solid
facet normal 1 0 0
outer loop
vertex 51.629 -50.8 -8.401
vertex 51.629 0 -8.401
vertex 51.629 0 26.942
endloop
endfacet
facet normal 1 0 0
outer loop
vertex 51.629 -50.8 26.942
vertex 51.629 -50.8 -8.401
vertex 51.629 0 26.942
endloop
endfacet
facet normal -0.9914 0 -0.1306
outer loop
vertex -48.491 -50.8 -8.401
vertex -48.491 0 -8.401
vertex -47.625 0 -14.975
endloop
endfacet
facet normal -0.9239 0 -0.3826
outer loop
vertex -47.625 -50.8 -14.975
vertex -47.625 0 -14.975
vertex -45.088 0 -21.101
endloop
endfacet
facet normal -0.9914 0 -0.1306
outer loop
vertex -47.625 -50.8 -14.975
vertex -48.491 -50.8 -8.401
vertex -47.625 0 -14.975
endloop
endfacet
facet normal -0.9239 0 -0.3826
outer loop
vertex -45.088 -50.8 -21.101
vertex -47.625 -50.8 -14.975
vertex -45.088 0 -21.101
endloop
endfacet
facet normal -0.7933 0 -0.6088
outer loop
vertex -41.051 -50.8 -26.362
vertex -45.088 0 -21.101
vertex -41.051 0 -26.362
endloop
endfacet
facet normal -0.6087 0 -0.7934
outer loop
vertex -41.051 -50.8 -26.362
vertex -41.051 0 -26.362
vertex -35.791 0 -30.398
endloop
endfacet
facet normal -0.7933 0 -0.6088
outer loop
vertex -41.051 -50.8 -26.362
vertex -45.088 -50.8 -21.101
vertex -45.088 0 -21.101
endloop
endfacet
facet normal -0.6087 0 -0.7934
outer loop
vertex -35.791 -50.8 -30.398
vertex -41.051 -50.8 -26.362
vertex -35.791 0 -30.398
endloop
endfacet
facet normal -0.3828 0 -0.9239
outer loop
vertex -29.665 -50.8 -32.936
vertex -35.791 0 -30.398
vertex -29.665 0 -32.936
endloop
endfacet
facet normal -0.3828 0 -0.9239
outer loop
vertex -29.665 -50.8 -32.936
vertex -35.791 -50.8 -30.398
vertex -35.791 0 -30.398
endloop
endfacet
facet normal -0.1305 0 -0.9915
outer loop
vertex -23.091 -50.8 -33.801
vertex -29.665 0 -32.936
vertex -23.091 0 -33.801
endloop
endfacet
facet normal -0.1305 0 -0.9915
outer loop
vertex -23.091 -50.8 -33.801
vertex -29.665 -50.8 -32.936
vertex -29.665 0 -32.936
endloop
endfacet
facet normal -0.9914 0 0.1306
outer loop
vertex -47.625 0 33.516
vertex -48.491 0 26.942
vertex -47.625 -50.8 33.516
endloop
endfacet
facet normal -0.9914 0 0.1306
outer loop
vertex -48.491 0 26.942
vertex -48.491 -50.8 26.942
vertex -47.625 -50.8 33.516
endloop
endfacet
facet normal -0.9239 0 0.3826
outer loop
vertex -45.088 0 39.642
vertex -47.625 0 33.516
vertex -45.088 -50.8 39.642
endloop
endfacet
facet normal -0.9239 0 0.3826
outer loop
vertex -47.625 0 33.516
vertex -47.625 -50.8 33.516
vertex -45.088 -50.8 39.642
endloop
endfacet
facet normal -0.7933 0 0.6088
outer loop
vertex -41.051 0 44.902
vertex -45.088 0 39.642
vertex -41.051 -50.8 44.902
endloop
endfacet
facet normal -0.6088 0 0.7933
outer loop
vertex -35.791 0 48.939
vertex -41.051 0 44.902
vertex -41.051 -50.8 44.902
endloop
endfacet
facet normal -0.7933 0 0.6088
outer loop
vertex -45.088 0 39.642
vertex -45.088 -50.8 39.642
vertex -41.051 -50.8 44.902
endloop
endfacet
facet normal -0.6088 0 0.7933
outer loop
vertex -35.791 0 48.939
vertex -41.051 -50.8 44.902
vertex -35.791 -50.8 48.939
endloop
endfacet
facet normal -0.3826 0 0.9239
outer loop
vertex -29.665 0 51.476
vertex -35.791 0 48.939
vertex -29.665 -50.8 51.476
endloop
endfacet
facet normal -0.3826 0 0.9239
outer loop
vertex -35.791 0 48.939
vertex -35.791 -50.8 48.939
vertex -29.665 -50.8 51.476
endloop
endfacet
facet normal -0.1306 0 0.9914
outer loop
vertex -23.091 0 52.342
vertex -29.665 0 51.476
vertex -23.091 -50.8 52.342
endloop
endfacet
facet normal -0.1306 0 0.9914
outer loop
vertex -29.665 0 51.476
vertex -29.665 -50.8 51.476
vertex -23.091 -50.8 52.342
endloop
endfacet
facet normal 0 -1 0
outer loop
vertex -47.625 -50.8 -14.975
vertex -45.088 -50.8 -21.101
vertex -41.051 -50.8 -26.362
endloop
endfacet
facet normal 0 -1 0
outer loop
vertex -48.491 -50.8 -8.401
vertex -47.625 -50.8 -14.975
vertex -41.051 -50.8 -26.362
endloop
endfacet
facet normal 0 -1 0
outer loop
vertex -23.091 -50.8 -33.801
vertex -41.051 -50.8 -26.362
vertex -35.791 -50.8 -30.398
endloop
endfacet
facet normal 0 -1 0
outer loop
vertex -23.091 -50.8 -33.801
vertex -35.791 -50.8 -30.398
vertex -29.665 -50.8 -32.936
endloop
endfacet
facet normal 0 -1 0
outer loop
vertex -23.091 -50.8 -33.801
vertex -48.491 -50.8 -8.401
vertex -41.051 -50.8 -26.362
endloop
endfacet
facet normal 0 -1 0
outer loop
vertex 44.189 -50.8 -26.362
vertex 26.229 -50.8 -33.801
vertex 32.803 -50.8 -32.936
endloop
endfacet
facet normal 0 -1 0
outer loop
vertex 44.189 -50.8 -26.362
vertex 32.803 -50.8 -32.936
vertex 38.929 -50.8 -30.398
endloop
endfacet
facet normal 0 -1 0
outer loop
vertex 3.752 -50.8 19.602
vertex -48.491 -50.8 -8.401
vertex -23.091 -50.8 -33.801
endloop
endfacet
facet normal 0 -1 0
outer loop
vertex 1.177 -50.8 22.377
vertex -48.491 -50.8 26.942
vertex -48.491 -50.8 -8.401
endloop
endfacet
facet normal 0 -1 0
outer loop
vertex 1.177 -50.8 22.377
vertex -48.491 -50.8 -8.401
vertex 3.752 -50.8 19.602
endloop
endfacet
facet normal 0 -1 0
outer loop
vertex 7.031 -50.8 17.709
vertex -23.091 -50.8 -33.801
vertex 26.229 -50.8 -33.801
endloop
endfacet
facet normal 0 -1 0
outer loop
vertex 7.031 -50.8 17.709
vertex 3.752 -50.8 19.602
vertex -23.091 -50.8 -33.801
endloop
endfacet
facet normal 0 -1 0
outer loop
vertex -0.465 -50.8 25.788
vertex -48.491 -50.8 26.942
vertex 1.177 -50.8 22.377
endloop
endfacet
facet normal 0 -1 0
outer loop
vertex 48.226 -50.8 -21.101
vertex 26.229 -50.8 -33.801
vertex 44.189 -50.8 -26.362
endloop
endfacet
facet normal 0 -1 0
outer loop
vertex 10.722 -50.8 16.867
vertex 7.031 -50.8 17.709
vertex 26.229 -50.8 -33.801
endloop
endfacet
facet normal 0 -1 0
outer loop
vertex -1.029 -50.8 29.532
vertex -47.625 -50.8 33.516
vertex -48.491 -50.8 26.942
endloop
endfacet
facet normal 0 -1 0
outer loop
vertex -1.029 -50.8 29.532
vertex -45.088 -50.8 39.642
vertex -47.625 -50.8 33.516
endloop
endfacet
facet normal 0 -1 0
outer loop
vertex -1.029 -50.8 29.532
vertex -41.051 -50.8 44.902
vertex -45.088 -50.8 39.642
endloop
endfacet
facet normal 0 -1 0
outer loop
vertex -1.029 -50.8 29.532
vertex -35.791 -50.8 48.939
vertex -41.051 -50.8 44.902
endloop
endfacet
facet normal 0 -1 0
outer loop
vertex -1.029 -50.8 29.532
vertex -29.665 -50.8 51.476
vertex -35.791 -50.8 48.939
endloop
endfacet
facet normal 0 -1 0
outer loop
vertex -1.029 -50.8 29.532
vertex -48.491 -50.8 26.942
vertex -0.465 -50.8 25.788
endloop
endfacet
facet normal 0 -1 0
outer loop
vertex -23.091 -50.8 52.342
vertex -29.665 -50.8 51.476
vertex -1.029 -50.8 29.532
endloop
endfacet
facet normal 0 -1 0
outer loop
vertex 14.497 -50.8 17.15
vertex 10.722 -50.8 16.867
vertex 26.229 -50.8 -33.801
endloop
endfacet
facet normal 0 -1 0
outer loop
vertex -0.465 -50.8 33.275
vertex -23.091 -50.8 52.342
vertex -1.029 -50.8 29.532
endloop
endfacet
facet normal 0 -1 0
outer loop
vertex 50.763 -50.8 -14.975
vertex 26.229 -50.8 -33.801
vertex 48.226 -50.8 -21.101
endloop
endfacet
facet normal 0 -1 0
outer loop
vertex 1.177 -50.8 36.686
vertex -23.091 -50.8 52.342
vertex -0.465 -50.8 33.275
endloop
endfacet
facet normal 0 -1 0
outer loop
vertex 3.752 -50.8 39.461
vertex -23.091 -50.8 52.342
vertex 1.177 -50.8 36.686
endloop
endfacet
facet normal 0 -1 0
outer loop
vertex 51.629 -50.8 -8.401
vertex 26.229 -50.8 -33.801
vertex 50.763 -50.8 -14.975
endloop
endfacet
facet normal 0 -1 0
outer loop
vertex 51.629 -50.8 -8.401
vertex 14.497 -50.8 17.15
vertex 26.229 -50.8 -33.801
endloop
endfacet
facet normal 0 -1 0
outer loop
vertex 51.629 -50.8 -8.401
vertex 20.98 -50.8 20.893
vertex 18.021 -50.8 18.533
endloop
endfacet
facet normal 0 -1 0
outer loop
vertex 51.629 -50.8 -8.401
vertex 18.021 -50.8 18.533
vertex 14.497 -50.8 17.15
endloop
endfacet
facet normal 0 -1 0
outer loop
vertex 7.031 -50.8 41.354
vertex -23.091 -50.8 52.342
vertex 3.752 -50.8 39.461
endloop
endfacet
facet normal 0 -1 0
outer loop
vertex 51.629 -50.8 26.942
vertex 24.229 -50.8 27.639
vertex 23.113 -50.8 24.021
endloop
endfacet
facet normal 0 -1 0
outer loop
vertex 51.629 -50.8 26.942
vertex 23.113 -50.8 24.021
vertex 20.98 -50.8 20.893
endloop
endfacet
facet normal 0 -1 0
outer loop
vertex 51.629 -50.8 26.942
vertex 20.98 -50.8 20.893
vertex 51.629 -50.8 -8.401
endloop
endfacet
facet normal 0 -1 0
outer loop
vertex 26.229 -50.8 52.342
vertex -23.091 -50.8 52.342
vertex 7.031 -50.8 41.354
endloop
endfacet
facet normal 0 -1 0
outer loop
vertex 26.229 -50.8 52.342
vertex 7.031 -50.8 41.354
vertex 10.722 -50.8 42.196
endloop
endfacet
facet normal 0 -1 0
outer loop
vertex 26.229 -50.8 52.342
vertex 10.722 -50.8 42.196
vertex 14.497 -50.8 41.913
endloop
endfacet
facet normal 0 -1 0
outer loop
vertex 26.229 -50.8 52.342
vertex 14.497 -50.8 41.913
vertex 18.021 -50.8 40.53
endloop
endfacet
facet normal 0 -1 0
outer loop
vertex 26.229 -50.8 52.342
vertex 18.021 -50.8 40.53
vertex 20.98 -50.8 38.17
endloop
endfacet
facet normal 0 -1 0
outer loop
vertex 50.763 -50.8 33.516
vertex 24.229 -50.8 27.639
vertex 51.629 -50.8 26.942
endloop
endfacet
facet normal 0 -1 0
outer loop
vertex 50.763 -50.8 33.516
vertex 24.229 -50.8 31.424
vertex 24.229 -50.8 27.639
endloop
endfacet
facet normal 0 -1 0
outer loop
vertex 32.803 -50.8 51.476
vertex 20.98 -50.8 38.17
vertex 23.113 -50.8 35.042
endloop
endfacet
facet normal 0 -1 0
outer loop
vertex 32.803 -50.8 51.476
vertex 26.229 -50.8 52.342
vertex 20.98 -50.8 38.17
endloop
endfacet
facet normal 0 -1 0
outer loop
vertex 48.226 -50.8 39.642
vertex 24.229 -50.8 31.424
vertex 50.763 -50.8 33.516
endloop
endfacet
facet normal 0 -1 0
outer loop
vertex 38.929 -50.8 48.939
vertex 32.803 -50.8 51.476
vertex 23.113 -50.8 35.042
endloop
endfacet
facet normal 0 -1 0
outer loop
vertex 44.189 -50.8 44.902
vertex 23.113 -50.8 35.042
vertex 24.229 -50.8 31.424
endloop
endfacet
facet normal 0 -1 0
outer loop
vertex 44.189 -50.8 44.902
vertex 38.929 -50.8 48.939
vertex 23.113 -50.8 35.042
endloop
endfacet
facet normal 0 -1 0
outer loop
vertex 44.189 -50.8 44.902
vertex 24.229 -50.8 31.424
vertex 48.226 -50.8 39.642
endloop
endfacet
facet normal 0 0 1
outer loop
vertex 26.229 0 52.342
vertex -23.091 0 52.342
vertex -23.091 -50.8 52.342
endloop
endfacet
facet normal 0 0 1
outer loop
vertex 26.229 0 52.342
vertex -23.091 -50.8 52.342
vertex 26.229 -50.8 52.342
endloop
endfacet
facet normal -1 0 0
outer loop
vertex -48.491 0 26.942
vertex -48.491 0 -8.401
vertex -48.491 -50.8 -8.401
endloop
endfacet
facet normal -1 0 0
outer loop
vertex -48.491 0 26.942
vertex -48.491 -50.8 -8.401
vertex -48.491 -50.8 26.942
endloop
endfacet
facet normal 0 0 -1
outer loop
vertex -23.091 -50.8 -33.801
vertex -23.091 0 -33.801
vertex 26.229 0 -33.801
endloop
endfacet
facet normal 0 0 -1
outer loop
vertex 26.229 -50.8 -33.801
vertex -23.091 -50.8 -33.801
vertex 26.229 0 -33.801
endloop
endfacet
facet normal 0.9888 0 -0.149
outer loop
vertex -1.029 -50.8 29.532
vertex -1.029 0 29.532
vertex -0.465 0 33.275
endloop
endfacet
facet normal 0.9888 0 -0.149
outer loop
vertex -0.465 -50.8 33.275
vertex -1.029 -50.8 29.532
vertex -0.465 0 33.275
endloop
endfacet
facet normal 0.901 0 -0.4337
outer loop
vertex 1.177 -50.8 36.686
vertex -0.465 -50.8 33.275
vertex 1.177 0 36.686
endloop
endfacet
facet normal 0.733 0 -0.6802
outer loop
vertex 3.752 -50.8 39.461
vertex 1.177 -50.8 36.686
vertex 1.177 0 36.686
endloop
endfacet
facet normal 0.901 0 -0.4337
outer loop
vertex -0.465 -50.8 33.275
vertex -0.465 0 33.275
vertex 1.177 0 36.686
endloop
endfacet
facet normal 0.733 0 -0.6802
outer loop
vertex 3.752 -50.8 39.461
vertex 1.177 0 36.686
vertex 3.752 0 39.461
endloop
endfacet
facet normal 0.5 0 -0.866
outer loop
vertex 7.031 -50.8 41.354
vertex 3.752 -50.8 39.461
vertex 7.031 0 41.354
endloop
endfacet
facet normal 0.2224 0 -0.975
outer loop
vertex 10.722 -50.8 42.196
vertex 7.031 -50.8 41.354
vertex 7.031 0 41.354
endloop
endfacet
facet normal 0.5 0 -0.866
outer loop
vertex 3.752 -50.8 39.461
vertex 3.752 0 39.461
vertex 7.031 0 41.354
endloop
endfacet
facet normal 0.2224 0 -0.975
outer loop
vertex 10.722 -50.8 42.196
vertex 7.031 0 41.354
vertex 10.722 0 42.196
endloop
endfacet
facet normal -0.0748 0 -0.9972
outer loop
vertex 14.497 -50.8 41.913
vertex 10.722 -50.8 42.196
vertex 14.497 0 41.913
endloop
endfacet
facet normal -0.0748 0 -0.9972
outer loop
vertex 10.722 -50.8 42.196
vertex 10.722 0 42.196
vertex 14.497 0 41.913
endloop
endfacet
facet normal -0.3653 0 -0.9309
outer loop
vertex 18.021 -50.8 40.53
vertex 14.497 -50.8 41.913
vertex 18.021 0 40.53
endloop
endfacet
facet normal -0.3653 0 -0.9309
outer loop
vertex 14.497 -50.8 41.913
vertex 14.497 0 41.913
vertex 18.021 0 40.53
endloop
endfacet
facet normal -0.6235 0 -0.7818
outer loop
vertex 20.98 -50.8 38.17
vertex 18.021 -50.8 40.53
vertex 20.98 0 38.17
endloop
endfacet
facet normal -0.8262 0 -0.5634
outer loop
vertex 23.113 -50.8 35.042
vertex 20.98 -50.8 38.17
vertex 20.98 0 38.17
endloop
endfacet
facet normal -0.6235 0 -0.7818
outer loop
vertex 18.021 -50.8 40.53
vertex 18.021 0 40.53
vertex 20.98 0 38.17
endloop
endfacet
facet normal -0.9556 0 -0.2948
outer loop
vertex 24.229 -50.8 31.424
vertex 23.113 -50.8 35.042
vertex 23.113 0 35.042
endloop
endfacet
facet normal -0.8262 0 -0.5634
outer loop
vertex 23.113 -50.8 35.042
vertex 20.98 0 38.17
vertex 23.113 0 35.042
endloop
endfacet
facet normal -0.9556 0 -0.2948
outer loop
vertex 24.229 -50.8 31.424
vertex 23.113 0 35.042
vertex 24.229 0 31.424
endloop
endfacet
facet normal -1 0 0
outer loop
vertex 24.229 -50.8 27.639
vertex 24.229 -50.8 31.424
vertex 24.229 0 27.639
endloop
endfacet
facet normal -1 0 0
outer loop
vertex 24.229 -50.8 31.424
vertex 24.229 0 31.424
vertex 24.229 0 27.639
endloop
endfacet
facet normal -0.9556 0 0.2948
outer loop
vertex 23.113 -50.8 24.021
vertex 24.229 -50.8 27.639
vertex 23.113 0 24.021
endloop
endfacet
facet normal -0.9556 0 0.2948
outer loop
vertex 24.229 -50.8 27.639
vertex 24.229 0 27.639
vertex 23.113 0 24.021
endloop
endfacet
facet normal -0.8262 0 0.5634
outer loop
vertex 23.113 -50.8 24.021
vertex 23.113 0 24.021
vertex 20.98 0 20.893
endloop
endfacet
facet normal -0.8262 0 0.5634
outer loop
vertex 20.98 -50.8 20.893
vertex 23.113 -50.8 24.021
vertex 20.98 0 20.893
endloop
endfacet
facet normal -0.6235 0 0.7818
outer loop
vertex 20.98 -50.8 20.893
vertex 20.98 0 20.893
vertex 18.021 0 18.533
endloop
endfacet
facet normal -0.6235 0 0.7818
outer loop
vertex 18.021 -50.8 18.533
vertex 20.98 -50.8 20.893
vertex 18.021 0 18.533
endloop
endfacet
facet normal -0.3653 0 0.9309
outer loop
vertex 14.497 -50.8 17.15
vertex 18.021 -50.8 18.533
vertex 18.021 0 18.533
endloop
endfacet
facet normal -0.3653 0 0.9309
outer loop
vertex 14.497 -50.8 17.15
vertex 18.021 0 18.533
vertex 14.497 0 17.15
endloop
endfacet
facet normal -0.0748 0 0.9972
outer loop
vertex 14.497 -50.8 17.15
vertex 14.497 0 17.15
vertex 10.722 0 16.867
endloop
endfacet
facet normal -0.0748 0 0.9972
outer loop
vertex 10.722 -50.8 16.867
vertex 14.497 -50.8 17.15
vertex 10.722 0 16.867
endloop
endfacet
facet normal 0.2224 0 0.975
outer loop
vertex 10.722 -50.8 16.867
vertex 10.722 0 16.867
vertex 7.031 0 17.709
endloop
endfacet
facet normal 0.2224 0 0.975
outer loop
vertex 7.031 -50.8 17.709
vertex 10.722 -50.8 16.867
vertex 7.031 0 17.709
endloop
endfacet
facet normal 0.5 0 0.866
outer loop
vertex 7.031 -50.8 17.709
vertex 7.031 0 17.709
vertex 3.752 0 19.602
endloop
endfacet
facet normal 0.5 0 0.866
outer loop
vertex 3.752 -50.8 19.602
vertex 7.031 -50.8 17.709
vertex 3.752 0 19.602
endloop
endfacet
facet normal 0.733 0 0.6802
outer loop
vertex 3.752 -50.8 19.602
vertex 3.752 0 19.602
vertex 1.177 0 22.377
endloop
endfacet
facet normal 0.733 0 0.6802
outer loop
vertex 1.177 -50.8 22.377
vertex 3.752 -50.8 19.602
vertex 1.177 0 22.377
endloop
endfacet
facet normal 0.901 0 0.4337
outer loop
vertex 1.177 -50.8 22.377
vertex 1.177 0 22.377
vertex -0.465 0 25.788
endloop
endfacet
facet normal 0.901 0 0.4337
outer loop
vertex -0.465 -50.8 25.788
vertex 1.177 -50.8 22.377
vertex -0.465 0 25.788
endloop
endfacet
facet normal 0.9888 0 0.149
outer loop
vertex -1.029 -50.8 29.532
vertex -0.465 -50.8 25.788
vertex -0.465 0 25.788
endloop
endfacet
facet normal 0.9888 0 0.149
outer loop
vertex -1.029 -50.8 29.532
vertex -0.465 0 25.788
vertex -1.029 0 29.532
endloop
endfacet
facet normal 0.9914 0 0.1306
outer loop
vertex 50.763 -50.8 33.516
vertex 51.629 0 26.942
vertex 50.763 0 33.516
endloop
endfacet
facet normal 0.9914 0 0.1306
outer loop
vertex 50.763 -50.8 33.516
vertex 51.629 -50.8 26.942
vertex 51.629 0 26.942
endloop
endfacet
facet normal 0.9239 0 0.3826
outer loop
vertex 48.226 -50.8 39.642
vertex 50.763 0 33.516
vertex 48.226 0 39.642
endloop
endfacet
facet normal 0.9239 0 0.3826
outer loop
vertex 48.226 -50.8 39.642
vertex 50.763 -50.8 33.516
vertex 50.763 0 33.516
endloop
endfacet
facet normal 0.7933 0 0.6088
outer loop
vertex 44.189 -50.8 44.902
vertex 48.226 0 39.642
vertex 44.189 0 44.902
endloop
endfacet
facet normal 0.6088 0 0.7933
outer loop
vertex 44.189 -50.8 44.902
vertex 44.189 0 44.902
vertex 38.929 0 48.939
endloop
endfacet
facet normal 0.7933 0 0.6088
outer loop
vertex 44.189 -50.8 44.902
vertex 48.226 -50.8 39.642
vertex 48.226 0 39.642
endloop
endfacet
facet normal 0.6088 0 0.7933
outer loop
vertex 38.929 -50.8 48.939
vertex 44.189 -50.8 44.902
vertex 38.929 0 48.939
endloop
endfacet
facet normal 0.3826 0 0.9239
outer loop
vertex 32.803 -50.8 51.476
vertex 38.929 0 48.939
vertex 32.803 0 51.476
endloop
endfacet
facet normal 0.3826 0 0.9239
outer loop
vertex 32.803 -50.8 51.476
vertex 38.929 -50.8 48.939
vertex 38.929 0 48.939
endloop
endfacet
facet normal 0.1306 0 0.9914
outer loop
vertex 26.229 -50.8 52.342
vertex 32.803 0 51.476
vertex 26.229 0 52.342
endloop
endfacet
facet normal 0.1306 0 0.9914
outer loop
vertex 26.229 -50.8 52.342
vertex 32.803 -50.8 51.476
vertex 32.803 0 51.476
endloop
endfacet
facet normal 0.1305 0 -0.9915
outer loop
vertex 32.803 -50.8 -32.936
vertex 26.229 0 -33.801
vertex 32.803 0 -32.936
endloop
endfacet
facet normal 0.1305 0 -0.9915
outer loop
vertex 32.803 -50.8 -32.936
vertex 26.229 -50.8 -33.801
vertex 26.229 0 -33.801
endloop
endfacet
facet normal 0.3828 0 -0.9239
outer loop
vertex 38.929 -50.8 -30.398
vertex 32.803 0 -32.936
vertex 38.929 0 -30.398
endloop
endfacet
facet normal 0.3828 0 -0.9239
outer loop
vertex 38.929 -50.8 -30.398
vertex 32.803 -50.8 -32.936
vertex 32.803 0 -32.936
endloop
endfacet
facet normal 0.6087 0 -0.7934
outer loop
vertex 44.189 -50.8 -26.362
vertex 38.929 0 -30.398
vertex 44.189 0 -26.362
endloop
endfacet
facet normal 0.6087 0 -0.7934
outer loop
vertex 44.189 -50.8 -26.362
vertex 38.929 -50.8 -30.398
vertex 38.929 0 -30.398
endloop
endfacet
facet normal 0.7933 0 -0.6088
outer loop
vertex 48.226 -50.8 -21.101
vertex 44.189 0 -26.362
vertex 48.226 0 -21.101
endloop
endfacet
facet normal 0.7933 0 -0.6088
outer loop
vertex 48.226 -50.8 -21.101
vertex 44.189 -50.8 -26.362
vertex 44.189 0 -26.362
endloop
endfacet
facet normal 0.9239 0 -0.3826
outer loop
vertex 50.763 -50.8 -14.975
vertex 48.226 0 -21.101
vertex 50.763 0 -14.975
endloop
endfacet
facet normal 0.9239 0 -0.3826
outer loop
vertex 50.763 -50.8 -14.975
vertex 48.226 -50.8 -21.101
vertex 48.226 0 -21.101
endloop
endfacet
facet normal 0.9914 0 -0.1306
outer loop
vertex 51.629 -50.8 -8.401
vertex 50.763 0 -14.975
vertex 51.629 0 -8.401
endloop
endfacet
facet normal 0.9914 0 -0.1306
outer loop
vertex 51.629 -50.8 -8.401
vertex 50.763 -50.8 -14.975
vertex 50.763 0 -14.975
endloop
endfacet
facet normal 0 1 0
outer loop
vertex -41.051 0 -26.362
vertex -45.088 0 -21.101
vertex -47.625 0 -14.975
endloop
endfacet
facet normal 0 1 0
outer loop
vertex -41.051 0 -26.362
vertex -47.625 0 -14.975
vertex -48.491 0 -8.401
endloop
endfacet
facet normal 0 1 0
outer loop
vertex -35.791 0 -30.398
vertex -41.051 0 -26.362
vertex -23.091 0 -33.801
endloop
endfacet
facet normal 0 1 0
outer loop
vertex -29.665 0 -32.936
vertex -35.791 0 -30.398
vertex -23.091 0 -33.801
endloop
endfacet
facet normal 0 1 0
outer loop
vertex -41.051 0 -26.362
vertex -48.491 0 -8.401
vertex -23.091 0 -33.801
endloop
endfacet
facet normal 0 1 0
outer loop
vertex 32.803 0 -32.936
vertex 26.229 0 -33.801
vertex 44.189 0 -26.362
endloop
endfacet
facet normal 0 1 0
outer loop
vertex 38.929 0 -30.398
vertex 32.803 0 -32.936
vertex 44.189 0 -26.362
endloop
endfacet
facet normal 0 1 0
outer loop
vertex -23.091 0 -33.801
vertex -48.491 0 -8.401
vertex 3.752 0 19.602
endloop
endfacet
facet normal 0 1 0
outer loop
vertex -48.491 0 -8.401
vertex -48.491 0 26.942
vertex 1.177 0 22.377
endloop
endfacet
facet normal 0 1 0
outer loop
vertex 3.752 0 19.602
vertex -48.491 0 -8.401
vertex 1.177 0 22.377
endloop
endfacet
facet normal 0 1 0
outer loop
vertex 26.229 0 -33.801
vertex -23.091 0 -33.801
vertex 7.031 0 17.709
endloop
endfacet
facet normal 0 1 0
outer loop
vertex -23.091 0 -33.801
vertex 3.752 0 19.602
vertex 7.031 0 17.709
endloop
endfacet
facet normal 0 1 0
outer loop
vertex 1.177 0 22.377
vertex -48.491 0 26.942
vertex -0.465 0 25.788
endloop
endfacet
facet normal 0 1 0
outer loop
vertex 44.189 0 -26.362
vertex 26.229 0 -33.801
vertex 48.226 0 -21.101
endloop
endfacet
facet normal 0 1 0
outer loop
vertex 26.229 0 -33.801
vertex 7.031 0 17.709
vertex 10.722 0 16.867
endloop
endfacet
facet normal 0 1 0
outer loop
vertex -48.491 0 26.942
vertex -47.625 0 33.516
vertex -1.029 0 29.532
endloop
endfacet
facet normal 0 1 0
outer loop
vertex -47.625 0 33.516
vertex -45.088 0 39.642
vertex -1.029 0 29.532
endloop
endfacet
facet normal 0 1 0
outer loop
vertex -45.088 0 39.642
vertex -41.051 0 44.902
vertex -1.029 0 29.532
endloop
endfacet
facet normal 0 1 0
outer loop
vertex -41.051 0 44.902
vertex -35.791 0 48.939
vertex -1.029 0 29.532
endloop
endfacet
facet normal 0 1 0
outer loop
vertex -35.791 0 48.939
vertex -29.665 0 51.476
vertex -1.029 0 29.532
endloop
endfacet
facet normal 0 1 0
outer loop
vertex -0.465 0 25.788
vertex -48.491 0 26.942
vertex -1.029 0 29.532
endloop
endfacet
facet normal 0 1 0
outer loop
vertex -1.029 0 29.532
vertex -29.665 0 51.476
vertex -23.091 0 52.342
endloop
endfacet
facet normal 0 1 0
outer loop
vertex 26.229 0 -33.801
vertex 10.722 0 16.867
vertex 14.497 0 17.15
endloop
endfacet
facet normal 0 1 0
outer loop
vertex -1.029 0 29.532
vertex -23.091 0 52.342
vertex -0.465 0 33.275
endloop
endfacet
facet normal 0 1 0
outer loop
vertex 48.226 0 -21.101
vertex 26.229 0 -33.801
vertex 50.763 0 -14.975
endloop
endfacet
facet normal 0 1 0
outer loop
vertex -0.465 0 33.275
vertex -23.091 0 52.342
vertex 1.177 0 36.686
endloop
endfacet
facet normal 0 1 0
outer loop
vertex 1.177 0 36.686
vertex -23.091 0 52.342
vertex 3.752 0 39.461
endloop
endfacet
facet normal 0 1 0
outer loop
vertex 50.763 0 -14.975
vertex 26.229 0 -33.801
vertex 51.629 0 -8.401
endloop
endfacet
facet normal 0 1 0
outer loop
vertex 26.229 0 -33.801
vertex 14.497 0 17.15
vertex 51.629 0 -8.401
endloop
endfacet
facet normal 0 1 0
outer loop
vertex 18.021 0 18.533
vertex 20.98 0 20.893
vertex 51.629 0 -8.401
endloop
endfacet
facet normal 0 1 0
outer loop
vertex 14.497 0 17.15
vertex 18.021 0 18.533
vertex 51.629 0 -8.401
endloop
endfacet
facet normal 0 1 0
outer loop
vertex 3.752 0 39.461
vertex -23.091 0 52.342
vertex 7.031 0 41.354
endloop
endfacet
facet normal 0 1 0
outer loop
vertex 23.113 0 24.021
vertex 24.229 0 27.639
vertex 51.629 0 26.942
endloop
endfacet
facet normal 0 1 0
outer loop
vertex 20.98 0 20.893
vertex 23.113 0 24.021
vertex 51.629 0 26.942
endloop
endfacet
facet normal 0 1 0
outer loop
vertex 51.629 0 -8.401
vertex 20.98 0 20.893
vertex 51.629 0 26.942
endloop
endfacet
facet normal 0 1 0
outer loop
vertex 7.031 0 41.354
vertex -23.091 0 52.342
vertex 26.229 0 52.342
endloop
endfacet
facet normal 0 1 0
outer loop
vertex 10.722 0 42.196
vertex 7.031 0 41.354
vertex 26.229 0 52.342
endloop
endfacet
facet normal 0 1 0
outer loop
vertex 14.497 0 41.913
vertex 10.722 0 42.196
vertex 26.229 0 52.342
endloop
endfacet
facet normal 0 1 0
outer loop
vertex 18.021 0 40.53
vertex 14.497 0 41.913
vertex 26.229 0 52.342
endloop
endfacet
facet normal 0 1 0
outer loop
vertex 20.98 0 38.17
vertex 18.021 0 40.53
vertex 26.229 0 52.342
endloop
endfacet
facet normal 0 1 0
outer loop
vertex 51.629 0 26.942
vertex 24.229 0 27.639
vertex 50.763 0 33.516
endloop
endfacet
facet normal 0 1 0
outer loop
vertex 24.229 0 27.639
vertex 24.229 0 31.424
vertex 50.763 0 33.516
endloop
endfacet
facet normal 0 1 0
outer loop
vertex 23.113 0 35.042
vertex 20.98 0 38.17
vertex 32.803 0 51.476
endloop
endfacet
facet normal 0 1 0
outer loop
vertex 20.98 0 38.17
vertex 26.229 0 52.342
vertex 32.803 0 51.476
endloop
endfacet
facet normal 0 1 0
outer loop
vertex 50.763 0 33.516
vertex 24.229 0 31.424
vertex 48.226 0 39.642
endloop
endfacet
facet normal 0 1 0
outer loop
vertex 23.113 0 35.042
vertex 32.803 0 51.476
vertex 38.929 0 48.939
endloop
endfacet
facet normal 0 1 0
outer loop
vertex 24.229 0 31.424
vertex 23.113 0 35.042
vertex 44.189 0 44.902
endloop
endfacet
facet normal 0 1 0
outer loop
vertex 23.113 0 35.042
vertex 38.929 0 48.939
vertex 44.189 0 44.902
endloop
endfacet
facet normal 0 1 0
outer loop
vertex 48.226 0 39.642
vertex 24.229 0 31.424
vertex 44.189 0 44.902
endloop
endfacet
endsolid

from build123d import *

# Parameters (mm, degrees)
F0_W     = 100.119468
F0_H     = 86.142674
F1_DEPTH = 50.8
F2_R     = 25.4
F4_D     = 25.4


with BuildPart() as f1:
    # F0 (on Front) → F1 (new body)
    with BuildSketch(Plane.XZ):
        with Locations((1.568822, 9.270322)):
            Rectangle(F0_W, F0_H)
    extrude(amount=F1_DEPTH)

    # F2
    f2_edges = [f1.edges().sort_by_distance(p)[0] for p in [
        (51.628556, -25.4, 52.341659),
        (-48.490912, -25.4, 52.341659),
        (-48.490912, -25.4, -33.801015),
        (51.628556, -25.4, -33.801015),
    ]]
    fillet(f2_edges, radius=F2_R)

    # F4 (through all)
    with Locations(Plane.XZ.offset(50.8)):
        with Locations((11.67061, 29.531537)):
            Hole(F4_D / 2)


solid = f1.part
